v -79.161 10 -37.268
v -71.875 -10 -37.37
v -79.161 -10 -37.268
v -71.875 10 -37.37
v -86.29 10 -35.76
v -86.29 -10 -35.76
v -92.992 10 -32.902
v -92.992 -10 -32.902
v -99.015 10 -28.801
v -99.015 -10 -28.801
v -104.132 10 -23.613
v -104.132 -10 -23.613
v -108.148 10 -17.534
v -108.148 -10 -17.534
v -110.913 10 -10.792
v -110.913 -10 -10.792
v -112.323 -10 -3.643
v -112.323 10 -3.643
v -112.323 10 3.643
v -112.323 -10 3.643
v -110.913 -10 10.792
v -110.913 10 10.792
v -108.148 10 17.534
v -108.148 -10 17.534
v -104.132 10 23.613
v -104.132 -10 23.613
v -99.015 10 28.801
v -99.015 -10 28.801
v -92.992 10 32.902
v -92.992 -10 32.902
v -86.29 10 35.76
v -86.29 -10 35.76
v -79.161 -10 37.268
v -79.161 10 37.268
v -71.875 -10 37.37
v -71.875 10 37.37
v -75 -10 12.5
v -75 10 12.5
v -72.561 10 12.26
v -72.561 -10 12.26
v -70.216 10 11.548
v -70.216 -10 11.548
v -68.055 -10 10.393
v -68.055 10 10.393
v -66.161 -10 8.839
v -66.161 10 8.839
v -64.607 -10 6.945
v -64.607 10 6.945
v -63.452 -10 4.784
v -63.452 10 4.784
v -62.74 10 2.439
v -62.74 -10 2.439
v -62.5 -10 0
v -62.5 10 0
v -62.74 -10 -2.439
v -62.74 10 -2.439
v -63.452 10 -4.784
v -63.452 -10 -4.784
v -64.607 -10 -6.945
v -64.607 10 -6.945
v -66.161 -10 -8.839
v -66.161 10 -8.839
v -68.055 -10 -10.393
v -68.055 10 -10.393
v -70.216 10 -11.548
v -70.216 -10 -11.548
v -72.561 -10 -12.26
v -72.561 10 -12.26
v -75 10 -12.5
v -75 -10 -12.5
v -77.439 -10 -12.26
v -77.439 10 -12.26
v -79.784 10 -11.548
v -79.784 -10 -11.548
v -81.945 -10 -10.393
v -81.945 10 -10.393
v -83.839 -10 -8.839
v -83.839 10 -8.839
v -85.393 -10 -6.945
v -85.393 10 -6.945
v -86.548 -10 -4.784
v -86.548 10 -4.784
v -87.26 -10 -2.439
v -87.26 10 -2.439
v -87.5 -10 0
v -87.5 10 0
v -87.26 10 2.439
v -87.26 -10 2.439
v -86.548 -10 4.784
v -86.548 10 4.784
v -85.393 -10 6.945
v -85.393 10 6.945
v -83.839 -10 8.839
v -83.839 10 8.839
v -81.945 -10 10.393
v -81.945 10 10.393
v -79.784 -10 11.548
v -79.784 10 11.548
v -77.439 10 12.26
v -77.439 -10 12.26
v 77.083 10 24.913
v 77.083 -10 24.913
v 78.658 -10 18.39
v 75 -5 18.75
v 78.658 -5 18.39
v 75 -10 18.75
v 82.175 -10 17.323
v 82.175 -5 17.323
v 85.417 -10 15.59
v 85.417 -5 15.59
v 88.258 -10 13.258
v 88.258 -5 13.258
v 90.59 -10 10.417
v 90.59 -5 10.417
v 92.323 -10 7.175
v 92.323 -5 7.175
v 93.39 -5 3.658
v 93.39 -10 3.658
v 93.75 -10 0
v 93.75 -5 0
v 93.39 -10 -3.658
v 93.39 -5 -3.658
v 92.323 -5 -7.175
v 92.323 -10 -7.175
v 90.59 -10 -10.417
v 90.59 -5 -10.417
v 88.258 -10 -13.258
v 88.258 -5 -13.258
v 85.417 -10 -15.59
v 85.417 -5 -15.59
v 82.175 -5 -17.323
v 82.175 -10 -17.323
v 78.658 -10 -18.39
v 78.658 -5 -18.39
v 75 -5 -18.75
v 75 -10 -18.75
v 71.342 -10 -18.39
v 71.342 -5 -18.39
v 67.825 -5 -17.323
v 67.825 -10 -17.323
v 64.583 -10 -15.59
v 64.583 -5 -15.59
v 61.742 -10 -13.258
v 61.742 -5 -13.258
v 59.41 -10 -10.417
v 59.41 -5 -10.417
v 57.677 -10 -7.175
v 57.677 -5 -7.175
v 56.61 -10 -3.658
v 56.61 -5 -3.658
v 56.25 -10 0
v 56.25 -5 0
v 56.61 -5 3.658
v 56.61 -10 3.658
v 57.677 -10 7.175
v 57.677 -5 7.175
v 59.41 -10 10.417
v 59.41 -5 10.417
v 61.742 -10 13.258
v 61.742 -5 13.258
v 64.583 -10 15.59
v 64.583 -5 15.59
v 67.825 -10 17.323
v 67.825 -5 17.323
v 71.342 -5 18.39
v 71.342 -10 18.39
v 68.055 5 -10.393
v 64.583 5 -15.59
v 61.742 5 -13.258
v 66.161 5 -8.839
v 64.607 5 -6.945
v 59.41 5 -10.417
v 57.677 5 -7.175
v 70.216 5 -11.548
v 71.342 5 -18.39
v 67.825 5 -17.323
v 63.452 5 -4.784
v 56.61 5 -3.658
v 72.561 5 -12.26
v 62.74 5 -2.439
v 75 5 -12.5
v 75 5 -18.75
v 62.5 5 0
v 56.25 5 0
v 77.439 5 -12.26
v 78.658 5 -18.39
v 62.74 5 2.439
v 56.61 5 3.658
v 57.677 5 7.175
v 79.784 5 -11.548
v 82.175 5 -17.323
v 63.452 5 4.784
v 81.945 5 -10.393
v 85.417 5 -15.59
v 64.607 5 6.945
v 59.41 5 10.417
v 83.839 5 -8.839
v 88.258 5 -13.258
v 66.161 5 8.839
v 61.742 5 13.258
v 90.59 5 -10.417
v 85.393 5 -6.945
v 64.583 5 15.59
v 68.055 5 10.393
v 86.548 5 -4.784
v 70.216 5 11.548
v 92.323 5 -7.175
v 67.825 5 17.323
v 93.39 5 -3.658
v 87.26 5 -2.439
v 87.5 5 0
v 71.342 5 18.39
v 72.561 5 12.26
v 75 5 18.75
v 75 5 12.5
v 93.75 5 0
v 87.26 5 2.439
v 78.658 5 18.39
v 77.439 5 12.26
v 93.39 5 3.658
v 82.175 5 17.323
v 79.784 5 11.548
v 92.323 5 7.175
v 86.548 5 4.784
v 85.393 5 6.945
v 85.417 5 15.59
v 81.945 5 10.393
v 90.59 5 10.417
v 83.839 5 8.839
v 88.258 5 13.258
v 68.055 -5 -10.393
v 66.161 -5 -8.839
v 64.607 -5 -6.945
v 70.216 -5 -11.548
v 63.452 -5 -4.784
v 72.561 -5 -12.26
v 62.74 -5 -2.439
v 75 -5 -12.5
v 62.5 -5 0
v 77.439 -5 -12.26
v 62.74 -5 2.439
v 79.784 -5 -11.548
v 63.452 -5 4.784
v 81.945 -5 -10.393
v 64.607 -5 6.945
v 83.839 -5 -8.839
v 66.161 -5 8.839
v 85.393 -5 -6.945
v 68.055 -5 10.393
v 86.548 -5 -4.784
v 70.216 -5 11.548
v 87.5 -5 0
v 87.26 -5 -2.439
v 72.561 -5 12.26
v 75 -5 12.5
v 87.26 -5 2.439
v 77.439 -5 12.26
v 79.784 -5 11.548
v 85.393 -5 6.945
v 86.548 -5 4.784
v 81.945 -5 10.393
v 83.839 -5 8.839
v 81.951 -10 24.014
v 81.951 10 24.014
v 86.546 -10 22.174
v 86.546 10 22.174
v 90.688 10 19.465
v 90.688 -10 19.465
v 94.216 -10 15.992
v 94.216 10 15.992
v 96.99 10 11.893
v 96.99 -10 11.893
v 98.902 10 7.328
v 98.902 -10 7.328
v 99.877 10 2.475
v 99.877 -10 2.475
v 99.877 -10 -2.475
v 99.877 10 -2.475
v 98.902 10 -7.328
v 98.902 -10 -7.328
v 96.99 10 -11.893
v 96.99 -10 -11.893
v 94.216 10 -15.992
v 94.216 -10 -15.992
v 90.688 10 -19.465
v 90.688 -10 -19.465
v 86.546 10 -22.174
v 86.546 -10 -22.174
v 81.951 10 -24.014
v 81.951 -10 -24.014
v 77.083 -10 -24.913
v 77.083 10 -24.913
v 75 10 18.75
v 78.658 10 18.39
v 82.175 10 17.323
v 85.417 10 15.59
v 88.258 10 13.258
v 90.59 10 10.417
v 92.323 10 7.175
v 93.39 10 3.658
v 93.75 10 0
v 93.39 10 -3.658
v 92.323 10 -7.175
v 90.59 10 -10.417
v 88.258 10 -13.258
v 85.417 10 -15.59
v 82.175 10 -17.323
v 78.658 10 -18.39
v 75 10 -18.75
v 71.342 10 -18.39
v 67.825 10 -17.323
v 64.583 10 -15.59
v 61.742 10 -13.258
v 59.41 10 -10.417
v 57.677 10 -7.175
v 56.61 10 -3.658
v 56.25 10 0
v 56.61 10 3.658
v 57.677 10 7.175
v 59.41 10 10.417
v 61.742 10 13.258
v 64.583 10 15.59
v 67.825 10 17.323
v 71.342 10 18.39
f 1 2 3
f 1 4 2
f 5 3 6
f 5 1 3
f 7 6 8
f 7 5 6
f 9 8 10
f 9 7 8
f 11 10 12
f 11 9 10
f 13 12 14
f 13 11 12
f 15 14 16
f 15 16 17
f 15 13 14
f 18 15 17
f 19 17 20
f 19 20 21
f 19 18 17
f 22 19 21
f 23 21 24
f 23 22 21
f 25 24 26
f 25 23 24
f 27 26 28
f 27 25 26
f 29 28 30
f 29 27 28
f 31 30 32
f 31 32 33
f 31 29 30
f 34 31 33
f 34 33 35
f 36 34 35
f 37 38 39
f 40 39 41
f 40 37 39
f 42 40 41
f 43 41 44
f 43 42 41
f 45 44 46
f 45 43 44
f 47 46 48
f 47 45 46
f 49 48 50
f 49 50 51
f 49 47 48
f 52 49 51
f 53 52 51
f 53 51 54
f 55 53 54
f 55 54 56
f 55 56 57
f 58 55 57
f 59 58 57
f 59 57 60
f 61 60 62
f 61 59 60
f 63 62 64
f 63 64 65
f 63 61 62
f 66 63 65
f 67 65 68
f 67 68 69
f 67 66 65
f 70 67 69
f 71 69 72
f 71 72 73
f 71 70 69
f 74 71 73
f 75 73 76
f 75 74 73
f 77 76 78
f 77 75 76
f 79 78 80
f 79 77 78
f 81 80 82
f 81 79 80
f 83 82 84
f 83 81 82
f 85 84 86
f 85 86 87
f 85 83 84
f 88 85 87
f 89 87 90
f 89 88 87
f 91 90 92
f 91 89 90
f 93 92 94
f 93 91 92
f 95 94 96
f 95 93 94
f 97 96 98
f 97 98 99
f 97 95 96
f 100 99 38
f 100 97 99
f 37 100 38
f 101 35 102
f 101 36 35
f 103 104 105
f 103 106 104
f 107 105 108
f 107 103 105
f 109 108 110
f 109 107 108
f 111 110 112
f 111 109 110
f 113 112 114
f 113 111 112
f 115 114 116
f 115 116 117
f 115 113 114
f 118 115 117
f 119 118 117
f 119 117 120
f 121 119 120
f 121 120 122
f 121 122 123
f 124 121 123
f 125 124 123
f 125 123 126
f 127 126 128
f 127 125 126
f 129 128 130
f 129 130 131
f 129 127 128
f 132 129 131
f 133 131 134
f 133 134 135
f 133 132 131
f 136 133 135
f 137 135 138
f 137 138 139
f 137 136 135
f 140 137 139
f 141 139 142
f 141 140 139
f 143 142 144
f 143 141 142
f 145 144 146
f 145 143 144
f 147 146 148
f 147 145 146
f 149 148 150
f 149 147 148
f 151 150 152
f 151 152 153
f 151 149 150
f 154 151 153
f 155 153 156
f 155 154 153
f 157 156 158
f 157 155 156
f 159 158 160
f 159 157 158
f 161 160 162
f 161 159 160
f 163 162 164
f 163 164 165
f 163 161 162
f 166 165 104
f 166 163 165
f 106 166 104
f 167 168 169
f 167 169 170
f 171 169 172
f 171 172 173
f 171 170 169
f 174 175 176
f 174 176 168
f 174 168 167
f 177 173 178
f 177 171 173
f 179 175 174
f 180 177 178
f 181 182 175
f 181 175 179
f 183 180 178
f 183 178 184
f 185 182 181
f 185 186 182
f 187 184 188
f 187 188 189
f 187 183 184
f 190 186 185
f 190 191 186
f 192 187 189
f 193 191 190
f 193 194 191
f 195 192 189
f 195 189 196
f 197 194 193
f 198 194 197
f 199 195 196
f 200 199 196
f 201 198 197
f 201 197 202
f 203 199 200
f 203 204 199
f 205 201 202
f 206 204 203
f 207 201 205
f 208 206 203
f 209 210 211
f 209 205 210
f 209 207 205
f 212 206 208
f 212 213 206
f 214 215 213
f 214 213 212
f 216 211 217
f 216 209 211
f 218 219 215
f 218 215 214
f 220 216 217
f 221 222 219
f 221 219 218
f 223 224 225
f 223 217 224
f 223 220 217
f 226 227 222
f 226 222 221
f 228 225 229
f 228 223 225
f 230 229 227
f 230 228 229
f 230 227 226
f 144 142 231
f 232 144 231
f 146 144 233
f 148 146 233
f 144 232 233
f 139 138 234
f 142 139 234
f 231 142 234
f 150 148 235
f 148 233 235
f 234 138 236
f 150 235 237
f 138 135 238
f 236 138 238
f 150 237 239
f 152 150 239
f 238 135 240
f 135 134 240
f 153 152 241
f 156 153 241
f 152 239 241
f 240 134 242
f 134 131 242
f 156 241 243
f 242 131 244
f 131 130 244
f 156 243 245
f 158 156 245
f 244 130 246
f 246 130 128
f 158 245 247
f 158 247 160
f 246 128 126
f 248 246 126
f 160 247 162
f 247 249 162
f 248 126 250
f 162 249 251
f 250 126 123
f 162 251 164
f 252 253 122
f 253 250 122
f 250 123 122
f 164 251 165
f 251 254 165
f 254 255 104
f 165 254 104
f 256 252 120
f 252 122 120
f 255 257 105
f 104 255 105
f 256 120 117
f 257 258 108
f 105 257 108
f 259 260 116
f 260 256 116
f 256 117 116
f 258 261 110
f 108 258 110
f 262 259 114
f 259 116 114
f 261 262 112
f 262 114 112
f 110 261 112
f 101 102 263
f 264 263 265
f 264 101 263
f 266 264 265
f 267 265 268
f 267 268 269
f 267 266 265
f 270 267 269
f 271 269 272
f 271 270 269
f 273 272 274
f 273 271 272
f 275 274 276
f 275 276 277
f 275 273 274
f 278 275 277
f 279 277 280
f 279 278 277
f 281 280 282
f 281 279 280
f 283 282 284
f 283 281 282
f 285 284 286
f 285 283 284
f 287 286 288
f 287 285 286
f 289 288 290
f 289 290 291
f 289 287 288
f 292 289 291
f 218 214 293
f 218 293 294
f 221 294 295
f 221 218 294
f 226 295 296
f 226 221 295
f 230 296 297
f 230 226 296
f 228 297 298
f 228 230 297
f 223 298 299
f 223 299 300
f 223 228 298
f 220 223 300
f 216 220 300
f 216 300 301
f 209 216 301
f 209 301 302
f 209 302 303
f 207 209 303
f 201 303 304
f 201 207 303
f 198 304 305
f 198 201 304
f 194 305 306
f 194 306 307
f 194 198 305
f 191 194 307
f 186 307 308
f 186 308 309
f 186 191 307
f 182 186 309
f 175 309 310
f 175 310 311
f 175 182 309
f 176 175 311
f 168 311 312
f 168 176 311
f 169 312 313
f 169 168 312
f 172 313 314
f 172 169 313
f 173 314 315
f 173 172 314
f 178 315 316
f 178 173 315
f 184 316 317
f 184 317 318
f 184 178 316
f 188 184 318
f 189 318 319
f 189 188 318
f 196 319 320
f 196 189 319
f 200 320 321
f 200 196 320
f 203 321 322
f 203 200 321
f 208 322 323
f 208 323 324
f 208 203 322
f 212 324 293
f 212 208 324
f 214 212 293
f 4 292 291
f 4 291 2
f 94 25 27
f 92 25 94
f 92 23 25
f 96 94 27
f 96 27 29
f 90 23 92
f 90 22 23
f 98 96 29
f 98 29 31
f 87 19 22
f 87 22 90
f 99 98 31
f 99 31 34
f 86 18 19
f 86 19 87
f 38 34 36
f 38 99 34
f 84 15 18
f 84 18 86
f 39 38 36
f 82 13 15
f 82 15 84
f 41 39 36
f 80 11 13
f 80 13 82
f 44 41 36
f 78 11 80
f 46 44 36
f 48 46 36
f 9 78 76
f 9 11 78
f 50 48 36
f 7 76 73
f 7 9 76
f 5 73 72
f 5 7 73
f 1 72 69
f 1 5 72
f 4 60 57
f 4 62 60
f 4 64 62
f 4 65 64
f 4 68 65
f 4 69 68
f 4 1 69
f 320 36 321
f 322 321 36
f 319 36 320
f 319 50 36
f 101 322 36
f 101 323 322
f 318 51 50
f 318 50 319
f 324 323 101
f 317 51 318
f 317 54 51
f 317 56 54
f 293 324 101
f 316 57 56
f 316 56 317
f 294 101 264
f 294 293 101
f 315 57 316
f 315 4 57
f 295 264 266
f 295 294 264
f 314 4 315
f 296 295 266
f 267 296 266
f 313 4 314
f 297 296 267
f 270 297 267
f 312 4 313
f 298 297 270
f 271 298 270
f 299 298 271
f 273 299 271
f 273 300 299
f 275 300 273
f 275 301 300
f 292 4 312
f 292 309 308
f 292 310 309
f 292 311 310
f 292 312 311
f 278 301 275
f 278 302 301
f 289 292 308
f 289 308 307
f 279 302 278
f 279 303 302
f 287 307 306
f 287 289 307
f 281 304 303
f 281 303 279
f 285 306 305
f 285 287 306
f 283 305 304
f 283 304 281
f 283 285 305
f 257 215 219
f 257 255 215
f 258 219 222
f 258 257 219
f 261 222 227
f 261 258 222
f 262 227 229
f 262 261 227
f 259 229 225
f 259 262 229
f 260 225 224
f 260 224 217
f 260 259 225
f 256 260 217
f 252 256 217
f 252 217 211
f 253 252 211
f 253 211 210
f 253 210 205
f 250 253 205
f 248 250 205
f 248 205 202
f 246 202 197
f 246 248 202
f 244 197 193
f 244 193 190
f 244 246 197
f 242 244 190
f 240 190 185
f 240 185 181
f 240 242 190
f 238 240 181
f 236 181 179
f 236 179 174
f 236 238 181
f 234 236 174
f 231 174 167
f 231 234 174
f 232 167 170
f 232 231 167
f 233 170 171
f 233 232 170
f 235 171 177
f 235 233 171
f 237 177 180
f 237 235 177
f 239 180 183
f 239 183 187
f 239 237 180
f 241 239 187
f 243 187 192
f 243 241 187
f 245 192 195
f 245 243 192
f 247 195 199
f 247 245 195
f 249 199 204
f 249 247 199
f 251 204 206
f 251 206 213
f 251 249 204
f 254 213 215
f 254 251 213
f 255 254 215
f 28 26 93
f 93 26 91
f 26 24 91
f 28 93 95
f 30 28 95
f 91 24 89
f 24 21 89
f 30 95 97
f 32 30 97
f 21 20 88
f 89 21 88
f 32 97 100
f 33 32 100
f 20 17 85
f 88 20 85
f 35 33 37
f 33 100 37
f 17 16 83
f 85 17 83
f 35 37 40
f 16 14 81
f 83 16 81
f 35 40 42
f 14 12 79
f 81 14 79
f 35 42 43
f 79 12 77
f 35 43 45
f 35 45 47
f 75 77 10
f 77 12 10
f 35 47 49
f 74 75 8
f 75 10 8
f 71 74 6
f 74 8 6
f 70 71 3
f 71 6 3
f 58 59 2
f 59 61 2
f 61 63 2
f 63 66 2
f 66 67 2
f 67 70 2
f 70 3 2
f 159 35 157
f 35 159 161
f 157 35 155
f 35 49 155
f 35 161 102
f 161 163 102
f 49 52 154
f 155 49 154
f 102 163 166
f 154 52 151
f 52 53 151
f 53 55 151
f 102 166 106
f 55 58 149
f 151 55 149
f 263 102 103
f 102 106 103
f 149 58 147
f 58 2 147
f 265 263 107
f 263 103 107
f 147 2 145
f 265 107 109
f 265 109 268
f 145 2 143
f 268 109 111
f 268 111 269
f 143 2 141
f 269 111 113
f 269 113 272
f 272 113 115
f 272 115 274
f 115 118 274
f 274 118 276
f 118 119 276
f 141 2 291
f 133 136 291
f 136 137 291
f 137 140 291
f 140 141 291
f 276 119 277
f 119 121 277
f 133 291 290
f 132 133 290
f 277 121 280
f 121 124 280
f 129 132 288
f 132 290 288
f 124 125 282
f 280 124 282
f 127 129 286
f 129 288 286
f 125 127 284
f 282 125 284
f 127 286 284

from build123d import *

# Parameters (mm, degrees)
SKETCH1_R           = 12.5
SKETCH1_R_2         = 18.75
BOSS_EXTRUDE1_DEPTH = 10
SKETCH1_3_R         = 18.75
SKETCH1_3_R_2       = 12.5
BOSS_EXTRUDE2_DEPTH = 5


with BuildPart() as part:
    # Sketch1 → Boss-Extrude1 (new, symmetric)
    with BuildSketch(Plane(origin=(0, 0, 0), x_dir=(1, 0, 0), z_dir=(0, 1, 0))):
        with BuildLine():
            Line((77.083333333, 24.913043215), (-71.875, 37.369564822))
            ThreePointArc((-71.875, 37.369564822), (-112.5, 0), (-71.875, -37.369564822))
            Line((-71.875, -37.369564822), (77.083333333, -24.913043215))
            ThreePointArc((77.083333333, -24.913043215), (100, 0), (77.083333333, 24.913043215))
        make_face()
        with Locations((-75, 0)):
            Circle(SKETCH1_R, mode=Mode.SUBTRACT)
        with Locations((75, 0)):
            Circle(SKETCH1_R_2, mode=Mode.SUBTRACT)
    extrude(amount=BOSS_EXTRUDE1_DEPTH, both=True)

    # Sketch1<3> → Boss-Extrude2 (add, symmetric)
    with BuildSketch(Plane(origin=(0, 0, 0), x_dir=(1, 0, 0), z_dir=(0, 1, 0))):
        with Locations((75, 0)):
            Circle(SKETCH1_3_R)
        with Locations((75, 0)):
            Circle(SKETCH1_3_R_2, mode=Mode.SUBTRACT)
    extrude(amount=BOSS_EXTRUDE2_DEPTH, both=True)


solid = part.part
